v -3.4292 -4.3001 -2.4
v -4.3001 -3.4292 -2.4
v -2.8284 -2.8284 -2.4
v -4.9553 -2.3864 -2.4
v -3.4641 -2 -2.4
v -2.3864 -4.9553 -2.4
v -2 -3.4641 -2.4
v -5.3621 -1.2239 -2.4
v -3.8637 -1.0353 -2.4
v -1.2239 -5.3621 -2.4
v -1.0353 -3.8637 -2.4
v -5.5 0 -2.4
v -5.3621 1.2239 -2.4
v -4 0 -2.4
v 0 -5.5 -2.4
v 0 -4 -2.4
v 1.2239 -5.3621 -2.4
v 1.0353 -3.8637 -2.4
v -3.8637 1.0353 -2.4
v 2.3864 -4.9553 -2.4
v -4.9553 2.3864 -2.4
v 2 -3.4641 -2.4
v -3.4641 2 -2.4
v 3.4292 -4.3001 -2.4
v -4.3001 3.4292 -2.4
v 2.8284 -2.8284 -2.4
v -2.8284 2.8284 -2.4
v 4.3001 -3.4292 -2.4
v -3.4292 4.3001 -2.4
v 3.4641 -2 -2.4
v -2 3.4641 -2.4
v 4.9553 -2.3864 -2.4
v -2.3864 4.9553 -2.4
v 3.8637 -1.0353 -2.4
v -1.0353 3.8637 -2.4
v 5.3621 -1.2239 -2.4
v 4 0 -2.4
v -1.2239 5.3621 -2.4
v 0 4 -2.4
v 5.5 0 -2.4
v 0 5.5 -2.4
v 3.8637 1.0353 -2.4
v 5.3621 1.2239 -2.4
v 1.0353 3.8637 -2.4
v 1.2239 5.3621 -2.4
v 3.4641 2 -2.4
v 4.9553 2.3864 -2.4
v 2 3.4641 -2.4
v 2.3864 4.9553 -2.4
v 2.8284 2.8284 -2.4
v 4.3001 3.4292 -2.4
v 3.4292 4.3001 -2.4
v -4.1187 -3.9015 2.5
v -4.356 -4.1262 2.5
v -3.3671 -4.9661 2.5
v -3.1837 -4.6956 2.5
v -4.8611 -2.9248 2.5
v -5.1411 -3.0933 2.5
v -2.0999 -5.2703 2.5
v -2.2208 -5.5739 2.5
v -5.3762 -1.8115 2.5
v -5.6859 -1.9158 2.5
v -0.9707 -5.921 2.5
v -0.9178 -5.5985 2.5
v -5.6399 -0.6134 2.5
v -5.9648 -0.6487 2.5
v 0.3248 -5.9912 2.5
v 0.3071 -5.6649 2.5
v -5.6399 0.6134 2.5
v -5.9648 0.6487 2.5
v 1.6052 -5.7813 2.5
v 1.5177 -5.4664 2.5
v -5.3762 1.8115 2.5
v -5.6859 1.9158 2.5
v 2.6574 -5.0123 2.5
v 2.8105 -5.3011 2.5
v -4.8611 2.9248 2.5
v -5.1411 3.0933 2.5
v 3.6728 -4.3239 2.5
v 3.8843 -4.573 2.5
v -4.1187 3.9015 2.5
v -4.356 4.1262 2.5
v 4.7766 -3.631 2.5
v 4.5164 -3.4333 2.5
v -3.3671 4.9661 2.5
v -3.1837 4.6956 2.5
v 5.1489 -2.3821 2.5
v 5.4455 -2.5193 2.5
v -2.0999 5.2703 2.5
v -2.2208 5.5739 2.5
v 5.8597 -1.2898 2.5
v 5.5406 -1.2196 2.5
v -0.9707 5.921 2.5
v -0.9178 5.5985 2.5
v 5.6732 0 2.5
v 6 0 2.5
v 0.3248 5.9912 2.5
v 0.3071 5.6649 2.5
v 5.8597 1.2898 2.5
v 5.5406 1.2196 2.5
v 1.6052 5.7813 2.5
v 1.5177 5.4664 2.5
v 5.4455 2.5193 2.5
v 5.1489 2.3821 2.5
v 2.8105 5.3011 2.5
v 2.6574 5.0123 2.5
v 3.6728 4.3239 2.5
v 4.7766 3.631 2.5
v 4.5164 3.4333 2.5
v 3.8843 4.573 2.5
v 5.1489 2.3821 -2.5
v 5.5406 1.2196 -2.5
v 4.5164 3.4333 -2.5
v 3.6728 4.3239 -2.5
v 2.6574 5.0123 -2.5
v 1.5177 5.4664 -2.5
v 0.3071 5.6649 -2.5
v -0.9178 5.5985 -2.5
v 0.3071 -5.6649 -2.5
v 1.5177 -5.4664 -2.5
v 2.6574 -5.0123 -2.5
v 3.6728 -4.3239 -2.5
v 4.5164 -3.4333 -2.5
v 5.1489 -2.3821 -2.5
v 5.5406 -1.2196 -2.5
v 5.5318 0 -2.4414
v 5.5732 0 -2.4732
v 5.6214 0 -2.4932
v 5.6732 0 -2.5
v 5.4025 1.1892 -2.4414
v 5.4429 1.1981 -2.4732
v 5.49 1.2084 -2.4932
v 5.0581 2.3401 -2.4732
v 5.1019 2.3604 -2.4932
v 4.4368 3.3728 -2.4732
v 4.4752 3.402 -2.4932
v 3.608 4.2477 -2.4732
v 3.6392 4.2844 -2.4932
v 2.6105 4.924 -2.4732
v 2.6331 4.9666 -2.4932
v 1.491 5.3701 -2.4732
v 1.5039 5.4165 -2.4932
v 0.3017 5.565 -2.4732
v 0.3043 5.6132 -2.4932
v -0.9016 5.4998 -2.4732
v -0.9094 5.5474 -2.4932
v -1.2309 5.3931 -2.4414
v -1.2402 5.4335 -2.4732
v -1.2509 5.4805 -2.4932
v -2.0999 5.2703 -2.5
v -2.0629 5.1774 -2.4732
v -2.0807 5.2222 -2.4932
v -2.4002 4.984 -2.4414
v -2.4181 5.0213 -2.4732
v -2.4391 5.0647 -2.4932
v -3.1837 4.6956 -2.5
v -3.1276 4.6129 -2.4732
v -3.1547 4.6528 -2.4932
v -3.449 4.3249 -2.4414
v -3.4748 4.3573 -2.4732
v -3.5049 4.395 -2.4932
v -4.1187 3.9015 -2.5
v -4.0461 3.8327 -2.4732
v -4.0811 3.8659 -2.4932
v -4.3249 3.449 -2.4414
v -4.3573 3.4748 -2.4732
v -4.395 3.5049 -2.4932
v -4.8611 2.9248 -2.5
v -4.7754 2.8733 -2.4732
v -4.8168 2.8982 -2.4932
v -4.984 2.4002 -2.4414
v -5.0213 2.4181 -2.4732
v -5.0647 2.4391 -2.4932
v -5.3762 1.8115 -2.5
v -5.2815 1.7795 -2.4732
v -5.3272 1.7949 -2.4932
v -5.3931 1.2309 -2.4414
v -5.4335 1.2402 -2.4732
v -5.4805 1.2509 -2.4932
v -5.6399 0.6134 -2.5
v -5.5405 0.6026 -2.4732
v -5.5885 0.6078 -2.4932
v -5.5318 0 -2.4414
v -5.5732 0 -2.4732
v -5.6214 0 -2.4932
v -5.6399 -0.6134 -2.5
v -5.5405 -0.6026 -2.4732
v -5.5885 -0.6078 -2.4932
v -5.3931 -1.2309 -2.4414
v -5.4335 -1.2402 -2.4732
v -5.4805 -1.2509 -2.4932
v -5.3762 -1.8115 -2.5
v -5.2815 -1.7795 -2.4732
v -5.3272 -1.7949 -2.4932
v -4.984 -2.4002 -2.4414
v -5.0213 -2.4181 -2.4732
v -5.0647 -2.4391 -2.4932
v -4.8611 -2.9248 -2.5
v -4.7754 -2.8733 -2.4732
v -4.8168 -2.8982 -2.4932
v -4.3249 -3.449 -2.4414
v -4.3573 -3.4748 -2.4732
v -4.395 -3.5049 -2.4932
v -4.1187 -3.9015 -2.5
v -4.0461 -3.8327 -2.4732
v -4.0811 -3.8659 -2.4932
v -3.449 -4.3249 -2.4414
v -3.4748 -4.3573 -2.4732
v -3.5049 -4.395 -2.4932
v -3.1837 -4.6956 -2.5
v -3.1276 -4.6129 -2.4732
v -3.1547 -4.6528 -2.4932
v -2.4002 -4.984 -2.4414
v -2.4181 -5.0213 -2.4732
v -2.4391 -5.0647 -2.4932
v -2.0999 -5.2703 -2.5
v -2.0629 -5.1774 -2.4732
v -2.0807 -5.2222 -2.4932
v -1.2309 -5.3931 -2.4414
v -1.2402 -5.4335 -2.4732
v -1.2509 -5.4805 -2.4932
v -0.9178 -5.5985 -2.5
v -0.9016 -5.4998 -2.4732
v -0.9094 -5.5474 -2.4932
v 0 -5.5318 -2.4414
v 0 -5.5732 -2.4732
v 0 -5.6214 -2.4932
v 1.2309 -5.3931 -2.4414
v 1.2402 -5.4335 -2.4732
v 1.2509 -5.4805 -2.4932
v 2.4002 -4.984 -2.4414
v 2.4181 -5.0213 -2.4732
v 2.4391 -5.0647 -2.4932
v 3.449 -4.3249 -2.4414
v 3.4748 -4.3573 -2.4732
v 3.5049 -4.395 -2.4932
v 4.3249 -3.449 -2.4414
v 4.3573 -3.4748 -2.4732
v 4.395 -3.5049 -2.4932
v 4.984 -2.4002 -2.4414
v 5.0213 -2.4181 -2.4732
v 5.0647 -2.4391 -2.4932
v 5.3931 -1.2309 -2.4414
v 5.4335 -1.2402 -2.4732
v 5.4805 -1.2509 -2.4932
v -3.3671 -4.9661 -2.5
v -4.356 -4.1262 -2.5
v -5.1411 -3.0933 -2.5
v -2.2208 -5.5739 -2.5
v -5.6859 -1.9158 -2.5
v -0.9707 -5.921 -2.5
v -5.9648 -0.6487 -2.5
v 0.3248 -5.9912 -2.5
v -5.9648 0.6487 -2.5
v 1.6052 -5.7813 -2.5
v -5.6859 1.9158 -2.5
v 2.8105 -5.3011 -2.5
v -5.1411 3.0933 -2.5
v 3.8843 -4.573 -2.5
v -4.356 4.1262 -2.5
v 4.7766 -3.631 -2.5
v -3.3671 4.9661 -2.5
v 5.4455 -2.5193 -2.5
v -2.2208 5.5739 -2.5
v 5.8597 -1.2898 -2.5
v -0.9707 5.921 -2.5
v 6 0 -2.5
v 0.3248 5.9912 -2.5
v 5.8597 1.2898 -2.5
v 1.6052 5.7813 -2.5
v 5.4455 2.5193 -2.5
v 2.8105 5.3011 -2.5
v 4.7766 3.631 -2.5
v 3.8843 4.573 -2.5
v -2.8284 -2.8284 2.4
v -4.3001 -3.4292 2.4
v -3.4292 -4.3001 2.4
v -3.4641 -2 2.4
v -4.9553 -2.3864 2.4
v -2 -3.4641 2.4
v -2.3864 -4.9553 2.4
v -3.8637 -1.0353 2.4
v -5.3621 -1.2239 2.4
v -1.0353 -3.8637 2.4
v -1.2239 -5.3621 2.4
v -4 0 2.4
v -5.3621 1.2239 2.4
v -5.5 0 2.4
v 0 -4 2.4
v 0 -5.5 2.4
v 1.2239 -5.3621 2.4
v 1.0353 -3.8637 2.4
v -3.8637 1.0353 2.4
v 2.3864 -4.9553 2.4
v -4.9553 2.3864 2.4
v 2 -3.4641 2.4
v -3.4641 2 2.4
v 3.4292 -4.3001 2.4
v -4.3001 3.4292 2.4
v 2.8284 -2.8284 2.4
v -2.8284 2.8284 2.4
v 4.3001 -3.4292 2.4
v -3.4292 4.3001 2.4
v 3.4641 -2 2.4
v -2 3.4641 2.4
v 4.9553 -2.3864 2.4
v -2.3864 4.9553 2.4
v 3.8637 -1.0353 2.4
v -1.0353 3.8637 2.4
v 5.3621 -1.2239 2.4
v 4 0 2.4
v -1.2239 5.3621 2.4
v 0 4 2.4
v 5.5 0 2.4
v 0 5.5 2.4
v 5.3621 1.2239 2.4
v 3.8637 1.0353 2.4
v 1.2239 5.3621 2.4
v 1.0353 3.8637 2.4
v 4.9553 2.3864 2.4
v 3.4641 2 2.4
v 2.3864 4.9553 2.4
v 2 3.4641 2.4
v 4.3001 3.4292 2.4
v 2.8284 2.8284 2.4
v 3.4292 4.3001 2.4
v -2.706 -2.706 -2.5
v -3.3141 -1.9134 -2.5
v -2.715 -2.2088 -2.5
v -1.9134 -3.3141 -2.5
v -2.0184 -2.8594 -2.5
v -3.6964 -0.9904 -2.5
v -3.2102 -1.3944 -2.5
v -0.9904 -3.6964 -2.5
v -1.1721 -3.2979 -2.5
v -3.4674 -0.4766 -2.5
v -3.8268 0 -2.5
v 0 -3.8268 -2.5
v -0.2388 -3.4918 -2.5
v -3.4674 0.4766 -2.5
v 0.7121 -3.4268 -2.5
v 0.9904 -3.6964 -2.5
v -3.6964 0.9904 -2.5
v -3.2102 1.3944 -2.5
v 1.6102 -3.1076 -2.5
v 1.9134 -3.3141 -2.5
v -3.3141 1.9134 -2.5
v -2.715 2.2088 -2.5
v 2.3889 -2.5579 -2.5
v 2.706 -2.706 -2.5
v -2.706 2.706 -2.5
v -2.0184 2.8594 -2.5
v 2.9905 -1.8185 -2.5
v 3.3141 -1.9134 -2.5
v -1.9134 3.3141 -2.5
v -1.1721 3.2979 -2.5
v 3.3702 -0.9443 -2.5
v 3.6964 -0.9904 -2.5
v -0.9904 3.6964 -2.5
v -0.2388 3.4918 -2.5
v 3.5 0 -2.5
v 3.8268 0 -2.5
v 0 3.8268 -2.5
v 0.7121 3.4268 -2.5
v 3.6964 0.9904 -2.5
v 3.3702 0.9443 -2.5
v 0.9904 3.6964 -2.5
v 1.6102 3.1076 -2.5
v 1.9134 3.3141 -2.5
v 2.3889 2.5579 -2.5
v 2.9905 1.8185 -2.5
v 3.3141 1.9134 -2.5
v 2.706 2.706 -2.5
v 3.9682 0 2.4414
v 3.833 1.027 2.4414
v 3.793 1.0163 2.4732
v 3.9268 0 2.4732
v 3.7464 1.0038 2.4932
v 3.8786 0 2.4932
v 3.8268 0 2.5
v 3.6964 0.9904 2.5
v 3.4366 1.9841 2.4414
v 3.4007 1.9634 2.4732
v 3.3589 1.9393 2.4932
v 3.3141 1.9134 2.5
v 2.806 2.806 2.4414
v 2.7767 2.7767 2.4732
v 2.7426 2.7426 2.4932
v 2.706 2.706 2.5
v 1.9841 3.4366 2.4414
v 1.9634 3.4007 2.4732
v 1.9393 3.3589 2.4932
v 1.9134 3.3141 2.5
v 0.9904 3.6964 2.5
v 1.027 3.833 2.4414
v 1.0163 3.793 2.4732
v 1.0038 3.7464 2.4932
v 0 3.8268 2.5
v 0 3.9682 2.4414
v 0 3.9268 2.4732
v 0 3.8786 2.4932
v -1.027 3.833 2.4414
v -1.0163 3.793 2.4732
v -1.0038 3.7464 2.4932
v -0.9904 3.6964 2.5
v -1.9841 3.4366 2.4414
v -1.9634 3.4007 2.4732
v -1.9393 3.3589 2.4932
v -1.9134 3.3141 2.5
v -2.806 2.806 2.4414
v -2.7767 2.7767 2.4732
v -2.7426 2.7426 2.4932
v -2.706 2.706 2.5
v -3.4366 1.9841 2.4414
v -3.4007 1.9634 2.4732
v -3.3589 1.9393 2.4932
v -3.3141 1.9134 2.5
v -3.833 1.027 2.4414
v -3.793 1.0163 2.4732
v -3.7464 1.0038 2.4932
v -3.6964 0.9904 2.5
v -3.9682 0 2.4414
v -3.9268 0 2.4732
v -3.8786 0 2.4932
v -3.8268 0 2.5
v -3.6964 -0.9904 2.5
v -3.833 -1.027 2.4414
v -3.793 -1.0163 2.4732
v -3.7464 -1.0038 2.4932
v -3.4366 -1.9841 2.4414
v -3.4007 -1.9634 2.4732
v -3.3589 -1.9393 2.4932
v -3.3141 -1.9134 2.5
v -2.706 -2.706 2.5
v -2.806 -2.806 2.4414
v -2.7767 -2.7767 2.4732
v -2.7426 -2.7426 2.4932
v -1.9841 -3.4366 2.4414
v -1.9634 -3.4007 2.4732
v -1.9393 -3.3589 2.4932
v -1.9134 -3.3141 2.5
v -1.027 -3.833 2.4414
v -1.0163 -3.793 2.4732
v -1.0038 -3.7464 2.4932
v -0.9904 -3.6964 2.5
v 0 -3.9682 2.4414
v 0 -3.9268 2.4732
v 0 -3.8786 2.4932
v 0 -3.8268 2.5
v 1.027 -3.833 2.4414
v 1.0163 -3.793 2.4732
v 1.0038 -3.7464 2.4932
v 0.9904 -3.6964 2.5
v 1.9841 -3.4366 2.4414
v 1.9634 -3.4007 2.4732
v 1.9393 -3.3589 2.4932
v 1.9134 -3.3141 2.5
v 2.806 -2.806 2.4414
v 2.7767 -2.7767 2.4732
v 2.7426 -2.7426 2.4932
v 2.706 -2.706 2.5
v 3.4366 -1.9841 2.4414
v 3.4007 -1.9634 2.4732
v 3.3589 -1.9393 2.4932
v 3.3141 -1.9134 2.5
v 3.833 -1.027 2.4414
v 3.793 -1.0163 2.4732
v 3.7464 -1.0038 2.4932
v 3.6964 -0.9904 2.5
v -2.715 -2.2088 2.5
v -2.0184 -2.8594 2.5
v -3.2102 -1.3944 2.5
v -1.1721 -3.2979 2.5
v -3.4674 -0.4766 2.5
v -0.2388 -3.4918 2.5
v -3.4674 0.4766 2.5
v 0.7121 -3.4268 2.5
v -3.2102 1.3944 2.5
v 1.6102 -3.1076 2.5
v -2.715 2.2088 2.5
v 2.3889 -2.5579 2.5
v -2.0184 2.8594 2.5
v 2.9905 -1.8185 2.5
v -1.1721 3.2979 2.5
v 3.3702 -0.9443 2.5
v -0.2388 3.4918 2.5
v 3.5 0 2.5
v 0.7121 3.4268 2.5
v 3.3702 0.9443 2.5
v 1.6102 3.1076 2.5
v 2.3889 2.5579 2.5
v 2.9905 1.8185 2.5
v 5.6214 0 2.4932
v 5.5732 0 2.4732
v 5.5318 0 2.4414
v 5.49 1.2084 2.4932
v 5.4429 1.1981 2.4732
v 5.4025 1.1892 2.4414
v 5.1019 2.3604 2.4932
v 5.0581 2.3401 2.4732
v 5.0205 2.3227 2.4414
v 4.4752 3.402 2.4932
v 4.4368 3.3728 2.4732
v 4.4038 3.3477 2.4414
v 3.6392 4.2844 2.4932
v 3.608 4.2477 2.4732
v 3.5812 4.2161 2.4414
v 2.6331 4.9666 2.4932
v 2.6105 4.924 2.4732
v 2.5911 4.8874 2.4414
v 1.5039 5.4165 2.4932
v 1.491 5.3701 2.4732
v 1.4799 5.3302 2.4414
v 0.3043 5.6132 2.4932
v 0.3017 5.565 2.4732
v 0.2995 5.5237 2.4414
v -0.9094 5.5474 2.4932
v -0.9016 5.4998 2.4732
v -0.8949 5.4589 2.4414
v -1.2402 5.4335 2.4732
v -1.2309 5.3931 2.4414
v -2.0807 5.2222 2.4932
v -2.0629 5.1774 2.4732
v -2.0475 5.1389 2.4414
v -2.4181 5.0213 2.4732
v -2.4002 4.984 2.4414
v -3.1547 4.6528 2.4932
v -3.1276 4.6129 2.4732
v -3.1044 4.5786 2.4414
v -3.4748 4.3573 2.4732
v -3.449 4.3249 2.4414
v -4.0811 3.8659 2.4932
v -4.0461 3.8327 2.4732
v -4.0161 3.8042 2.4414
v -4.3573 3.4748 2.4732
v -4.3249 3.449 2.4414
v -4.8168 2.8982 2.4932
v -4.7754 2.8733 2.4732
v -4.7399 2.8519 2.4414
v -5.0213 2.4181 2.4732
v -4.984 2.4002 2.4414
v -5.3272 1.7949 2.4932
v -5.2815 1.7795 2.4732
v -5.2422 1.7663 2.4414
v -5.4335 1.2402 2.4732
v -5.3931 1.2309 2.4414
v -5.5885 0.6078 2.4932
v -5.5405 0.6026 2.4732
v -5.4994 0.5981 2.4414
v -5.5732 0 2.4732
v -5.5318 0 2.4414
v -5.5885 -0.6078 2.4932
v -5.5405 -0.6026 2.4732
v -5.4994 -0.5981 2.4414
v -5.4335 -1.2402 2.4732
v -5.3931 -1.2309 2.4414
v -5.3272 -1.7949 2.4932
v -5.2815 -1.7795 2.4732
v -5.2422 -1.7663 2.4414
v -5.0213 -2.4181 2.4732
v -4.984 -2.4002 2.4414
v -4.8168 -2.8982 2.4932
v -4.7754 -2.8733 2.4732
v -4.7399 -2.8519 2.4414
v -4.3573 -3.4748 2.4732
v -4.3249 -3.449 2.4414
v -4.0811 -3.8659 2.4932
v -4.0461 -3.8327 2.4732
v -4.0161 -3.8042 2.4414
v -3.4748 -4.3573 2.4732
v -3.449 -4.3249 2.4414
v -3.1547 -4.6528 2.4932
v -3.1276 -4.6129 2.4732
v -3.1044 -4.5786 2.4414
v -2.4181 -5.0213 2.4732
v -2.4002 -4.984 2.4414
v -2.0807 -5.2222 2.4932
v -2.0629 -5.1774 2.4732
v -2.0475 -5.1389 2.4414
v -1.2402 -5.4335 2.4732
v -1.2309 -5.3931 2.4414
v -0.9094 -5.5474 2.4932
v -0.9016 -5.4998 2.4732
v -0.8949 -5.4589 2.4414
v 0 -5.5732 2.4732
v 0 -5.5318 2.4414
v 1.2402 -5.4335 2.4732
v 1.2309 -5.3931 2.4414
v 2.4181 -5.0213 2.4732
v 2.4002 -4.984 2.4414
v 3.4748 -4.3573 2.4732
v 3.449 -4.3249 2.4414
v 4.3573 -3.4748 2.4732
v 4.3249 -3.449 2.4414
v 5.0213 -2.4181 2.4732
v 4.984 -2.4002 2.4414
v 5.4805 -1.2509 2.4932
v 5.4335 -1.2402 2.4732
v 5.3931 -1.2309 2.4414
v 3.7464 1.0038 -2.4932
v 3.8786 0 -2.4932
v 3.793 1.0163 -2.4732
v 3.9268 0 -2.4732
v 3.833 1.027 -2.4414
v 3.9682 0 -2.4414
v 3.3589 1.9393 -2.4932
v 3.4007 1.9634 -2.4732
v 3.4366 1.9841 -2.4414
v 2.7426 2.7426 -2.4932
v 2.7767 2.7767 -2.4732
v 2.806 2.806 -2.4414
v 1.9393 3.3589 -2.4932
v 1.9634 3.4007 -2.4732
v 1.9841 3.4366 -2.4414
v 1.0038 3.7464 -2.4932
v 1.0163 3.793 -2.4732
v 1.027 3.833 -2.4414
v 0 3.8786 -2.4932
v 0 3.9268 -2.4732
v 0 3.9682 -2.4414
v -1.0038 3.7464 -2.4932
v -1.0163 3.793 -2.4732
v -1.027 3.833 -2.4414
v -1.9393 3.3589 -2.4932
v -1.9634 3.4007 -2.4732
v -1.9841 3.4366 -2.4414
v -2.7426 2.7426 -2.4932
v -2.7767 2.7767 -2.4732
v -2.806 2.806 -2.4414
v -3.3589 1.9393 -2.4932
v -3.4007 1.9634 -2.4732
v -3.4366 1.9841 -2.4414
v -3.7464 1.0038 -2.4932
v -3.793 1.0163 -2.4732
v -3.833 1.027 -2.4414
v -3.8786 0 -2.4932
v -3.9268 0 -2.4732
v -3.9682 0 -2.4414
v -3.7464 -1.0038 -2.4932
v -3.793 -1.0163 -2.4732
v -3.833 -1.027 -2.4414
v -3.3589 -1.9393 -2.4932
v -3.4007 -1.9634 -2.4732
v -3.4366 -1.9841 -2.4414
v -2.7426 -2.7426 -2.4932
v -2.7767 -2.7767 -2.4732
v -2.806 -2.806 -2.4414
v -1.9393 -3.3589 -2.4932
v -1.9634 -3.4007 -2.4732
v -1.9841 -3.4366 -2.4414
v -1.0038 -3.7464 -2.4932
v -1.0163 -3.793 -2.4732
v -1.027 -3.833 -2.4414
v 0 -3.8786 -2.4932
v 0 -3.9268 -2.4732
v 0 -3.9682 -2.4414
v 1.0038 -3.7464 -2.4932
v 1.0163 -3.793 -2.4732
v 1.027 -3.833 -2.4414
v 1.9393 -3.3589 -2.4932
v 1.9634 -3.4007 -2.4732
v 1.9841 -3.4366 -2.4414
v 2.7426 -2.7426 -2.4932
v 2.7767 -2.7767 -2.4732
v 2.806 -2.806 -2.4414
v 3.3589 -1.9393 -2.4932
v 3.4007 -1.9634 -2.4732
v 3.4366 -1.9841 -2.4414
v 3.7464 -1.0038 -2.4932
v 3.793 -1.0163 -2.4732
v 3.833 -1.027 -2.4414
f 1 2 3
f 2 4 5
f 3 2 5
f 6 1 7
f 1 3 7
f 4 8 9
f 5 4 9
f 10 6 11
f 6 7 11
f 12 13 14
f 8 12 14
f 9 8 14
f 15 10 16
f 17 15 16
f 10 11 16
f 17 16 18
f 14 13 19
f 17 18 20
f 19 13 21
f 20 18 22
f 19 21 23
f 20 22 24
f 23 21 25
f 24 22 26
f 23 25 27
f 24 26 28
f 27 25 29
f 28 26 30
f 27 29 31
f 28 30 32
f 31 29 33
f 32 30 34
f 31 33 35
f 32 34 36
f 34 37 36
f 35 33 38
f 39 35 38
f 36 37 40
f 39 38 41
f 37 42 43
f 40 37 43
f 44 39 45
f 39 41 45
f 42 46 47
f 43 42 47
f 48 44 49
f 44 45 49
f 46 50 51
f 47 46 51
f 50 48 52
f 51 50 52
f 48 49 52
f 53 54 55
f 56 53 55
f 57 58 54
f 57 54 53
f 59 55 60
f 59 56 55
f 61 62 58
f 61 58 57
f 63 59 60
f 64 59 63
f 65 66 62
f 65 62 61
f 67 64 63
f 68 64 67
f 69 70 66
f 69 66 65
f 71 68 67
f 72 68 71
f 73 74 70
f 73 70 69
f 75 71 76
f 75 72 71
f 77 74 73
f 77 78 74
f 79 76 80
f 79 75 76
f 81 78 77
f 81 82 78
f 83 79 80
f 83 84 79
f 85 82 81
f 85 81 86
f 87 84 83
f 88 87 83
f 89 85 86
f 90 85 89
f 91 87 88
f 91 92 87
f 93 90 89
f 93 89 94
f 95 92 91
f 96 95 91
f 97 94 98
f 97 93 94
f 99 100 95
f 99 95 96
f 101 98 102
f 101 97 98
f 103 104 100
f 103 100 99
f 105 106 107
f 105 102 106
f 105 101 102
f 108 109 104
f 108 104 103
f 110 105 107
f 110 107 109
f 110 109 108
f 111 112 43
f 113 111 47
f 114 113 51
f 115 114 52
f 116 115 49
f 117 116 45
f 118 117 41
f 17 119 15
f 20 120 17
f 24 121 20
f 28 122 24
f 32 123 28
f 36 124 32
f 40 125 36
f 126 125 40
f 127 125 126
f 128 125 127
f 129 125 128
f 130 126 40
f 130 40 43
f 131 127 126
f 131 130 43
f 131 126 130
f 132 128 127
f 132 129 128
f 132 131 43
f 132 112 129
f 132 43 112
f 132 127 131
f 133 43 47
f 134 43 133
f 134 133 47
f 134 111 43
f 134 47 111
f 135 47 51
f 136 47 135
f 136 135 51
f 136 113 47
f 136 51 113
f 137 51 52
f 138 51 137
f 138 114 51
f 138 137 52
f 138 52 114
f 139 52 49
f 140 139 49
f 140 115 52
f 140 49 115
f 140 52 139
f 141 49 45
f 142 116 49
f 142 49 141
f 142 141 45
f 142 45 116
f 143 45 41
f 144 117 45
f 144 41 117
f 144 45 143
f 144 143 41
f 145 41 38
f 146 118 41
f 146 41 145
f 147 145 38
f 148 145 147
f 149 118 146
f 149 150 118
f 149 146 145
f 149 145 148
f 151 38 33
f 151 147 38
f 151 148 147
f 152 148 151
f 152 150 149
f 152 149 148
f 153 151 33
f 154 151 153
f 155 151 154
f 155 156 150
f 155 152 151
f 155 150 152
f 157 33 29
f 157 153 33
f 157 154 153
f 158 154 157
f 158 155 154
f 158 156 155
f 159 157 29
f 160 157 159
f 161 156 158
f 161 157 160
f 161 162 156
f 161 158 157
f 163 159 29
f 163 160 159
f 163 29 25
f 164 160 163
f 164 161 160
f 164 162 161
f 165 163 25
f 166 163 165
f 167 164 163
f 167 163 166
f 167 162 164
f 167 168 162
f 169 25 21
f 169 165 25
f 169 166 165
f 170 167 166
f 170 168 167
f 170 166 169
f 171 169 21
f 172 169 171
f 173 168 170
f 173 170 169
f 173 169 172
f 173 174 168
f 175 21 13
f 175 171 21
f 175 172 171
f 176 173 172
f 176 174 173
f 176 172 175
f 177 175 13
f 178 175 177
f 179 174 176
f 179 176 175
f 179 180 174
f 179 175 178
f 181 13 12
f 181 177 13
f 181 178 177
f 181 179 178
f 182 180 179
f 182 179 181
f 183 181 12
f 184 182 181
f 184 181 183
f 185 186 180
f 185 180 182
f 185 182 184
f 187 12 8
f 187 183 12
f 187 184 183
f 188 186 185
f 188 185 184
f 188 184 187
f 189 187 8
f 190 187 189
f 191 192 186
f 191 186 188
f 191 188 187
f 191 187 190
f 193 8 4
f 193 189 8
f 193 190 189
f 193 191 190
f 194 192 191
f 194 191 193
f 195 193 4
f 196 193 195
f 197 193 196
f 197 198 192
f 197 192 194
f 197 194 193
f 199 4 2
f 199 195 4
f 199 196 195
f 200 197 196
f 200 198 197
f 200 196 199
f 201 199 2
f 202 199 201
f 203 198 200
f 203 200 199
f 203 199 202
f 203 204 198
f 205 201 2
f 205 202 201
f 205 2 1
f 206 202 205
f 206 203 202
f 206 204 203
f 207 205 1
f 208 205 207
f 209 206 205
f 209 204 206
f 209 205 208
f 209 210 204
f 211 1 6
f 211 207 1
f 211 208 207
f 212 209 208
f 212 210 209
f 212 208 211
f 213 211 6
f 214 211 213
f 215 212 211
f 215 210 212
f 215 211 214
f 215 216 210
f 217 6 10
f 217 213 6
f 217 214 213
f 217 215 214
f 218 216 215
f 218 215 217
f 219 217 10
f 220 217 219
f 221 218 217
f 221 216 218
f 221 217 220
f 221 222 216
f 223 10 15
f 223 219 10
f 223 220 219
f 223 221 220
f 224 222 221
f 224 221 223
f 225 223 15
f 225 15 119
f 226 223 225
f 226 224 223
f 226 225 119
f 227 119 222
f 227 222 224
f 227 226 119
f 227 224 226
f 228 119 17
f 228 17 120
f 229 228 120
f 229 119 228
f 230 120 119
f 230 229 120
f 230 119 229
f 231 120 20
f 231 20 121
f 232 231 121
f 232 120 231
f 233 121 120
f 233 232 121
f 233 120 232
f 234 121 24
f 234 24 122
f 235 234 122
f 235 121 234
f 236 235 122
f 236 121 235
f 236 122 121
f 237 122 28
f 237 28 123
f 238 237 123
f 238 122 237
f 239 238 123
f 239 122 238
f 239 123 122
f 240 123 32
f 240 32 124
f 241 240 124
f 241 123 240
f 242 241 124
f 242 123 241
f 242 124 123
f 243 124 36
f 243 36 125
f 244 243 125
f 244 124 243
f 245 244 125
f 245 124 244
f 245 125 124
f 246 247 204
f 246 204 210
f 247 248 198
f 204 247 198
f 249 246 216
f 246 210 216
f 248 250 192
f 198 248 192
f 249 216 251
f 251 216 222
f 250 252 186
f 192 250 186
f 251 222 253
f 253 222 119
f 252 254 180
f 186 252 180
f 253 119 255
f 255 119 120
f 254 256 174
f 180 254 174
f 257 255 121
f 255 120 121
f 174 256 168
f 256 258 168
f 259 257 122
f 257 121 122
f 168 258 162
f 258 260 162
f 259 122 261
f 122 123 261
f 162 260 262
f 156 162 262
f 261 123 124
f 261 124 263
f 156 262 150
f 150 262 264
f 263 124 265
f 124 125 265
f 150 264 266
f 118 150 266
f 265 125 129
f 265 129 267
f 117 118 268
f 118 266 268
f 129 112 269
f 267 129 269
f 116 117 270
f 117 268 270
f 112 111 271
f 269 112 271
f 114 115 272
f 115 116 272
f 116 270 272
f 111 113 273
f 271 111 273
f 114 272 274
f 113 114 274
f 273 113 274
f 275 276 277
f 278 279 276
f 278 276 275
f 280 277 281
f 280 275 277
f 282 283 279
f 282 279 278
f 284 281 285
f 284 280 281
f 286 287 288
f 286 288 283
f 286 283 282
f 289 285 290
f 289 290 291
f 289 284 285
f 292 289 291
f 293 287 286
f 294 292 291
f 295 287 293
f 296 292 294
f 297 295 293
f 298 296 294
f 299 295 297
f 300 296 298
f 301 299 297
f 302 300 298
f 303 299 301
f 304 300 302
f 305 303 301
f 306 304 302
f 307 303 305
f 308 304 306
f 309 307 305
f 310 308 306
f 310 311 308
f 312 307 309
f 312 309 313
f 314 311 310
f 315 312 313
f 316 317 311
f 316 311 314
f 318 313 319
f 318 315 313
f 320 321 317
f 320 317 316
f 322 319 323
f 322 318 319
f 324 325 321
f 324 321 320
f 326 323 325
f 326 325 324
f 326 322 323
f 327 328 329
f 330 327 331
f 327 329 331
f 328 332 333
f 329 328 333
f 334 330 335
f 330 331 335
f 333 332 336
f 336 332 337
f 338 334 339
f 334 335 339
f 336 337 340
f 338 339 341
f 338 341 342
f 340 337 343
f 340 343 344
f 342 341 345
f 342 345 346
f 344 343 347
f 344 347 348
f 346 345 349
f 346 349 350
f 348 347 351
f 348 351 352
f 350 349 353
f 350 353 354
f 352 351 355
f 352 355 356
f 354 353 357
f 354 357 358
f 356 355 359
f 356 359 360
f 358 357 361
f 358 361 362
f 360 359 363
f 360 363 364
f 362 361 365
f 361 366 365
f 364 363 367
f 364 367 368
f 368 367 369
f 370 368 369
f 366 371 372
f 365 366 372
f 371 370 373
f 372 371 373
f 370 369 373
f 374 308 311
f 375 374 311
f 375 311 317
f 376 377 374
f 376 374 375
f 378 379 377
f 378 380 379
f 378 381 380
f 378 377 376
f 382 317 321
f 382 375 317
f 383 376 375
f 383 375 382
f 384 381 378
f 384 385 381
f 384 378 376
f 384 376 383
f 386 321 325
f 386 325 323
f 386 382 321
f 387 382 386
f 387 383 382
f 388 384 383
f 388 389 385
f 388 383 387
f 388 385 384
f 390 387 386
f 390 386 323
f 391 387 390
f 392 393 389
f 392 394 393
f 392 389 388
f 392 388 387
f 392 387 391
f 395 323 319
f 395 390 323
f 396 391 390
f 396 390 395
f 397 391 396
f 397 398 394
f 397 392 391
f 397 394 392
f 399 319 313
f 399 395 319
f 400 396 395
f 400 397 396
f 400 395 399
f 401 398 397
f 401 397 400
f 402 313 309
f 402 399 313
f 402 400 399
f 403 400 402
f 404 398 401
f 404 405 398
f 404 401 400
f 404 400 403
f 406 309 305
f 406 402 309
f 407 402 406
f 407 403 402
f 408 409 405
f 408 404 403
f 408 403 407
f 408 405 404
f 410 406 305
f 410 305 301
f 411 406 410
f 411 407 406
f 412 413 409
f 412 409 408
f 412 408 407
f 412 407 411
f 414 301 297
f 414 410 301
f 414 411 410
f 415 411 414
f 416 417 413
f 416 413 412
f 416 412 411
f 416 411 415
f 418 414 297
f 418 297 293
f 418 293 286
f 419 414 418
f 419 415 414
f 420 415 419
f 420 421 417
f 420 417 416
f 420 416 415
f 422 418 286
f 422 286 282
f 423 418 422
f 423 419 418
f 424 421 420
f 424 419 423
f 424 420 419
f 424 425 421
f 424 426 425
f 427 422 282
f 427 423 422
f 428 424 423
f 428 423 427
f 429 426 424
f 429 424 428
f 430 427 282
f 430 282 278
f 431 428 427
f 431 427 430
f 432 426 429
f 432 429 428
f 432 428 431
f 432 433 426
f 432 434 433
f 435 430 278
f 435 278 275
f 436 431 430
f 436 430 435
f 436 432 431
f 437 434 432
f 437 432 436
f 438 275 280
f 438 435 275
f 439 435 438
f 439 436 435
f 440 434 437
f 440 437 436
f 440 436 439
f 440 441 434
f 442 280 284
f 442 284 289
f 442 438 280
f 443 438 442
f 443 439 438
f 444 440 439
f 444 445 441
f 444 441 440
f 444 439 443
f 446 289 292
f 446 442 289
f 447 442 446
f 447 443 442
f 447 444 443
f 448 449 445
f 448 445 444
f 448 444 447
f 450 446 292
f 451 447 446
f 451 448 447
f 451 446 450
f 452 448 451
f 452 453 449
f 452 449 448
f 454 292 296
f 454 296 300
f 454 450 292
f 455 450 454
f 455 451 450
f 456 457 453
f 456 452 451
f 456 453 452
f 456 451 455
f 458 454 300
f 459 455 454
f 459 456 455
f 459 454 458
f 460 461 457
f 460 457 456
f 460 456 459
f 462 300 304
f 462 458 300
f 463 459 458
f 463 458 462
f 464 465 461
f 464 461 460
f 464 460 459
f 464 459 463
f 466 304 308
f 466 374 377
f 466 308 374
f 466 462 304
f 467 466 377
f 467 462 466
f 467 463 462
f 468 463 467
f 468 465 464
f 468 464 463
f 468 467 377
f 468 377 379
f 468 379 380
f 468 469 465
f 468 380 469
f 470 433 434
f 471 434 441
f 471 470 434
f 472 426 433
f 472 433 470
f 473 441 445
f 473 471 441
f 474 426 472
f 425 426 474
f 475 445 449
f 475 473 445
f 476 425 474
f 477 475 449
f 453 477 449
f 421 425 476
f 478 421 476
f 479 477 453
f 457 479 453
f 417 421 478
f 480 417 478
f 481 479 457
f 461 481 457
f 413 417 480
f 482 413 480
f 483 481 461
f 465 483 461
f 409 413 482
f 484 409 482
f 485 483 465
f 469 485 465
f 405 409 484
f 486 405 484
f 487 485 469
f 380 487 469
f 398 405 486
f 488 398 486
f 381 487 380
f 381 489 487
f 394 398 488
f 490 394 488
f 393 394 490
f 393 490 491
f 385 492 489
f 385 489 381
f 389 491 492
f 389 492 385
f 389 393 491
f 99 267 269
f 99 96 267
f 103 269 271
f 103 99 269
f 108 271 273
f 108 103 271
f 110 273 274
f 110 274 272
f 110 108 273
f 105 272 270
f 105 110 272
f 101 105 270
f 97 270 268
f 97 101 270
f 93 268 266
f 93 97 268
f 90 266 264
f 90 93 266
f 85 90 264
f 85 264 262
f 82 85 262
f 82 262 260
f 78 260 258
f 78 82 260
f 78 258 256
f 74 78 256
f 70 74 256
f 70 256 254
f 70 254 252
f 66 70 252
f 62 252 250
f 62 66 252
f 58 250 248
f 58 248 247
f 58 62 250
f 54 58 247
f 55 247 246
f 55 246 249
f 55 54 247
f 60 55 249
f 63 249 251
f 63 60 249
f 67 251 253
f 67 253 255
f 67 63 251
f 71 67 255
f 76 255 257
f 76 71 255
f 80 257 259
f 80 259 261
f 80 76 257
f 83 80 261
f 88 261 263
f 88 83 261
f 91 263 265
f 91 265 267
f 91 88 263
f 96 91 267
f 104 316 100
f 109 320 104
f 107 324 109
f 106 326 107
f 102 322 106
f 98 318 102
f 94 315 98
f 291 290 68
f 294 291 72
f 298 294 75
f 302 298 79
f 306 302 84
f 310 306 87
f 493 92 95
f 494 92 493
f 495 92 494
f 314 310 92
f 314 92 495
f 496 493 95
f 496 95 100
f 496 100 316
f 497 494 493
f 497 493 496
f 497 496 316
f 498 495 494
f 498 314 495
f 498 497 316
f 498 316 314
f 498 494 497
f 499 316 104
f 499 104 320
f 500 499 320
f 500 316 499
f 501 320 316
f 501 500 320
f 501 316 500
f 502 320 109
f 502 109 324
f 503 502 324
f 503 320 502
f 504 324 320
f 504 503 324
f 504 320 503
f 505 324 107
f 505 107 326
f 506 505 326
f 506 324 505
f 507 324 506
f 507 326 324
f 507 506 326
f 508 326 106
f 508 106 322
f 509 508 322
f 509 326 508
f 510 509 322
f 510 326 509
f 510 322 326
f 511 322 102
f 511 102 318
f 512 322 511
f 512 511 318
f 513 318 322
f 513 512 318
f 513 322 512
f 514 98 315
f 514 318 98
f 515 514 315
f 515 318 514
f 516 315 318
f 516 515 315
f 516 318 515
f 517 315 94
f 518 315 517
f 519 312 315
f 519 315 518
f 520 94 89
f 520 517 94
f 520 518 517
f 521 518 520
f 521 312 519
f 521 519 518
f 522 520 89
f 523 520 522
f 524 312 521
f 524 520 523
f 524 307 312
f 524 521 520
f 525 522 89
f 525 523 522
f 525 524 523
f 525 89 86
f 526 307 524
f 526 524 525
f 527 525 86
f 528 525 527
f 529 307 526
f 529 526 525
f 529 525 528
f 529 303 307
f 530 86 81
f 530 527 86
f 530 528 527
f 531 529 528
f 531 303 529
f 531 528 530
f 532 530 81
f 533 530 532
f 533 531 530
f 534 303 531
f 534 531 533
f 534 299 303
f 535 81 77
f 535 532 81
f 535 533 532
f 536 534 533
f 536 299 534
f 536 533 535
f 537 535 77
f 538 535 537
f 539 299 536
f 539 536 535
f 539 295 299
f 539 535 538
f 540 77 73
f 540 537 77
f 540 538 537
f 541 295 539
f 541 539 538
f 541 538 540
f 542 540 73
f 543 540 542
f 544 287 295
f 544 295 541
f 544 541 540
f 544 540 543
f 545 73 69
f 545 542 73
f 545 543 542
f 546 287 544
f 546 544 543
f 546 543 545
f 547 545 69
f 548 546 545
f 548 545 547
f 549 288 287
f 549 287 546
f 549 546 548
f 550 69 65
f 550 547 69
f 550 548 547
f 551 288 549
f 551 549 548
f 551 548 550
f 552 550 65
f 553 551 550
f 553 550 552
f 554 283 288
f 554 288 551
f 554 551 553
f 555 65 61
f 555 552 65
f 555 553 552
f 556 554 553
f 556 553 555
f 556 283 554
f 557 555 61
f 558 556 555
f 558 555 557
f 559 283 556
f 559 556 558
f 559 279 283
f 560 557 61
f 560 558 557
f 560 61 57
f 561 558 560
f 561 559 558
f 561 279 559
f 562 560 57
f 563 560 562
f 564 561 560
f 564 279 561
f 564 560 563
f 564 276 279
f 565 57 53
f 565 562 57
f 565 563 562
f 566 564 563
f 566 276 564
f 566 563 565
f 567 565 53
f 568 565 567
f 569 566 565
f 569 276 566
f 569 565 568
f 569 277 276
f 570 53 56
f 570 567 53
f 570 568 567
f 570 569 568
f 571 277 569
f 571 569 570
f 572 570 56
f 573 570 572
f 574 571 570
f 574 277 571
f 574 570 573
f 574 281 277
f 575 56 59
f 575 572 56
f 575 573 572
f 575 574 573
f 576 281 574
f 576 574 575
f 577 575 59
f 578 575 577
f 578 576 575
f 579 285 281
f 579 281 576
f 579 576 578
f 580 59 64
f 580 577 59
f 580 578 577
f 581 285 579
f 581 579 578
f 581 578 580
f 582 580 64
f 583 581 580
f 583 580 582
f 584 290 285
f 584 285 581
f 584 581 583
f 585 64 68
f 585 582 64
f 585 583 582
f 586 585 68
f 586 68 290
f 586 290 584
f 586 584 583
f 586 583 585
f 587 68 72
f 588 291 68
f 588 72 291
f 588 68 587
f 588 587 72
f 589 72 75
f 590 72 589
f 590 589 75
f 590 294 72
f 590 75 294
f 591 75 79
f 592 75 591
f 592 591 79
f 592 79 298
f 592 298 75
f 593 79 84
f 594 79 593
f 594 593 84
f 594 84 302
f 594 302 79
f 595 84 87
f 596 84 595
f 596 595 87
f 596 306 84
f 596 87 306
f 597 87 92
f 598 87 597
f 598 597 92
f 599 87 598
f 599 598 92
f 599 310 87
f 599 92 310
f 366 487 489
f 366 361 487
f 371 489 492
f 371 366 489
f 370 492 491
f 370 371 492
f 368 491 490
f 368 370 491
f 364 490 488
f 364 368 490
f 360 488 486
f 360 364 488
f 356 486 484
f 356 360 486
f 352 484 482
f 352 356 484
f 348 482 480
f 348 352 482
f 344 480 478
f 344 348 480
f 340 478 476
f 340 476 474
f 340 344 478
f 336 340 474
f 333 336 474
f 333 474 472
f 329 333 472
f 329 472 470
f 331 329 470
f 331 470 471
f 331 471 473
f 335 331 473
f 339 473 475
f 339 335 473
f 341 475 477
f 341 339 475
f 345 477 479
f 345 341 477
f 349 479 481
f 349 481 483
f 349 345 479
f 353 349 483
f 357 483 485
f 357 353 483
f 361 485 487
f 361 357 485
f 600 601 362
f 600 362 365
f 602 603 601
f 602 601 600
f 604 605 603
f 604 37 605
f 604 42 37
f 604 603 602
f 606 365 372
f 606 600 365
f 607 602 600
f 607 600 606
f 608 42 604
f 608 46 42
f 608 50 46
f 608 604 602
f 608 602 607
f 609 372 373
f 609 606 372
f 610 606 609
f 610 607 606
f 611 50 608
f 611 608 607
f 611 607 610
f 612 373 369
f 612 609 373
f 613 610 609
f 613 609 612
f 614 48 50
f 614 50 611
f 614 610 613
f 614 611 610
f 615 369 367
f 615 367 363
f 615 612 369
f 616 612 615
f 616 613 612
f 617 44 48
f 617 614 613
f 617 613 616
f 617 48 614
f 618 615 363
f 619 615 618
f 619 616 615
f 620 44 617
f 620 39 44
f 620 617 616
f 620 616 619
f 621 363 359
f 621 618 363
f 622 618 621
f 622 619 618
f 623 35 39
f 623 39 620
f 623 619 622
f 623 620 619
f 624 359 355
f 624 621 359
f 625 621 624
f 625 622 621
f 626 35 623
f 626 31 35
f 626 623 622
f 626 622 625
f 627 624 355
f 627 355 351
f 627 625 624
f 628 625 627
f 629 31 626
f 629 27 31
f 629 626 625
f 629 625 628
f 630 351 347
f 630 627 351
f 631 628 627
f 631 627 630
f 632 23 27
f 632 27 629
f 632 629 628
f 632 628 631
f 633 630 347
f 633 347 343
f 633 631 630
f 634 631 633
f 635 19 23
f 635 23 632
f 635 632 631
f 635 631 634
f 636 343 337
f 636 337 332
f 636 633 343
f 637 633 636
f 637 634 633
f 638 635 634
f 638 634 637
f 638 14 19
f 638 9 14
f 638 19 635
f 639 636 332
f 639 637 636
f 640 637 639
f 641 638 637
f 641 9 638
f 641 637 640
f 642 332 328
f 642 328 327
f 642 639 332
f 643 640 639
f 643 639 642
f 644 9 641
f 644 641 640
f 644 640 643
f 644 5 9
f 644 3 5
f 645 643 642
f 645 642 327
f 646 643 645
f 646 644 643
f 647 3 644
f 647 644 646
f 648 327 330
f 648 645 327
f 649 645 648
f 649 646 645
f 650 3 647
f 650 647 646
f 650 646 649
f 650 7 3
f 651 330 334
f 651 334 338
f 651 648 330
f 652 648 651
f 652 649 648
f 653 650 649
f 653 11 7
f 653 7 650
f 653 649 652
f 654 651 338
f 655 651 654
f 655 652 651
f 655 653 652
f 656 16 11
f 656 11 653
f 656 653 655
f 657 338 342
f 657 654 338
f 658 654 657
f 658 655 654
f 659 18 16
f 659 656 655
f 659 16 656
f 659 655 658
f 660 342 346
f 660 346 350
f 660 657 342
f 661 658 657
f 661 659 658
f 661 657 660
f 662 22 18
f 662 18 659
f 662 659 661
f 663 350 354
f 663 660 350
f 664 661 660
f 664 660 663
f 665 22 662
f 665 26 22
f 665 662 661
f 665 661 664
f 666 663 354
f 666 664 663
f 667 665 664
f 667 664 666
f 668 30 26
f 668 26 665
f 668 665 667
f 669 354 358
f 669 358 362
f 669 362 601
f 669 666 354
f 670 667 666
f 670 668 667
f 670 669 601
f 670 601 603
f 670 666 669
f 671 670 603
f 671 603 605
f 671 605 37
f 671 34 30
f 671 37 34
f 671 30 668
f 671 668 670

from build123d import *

# Parameters (mm, degrees)
SKETCH_1_R          = 6
SKETCH_1_R_2        = 3.5
EXTRUDE_1_DEPTH     = 2.5
SKETCH_2_R          = 5.5
SKETCH_2_R_2        = 4
CUT_EXTRUDE_1_DEPTH = 0.1
FILLET_1_R          = 0.2


with BuildPart() as part:
    # 草图1 → 凸台-拉伸1 (new, symmetric)
    with BuildSketch(Plane.XY):
        Circle(SKETCH_1_R)
        Circle(SKETCH_1_R_2, mode=Mode.SUBTRACT)
    extrude(amount=EXTRUDE_1_DEPTH, both=True)

    # 草图2 → 切除-拉伸1 (cut)
    with BuildSketch(Plane.XY.offset(2.5)):
        Circle(SKETCH_2_R)
        Circle(SKETCH_2_R_2, mode=Mode.SUBTRACT)
    cut_extrude_1 = extrude(amount=-CUT_EXTRUDE_1_DEPTH, mode=Mode.SUBTRACT)

    # 镜向1: 切除-拉伸1 across plane
    add(cut_extrude_1.mirror(Plane.XY), mode=Mode.SUBTRACT)

    # 圆角1
    # the kernel refuses this fillet: 0.2 mm, written as the material it takes off along each edge
    with BuildSketch(Plane(origin=(0, 0, 2.5), x_dir=(1, 0, 0), z_dir=(0, -1, 0))) as fillet_1_piece_1:
        with BuildLine():
            CenterArc((5.673205081, -0.2), FILLET_1_R, 90, 60)
            Line((5.5, -0.1), (5.496535898, -0.098))
            ThreePointArc((5.496535898, -0.098), (5.496, -0.05), (5.496, 0))
            Line((5.496, 0), (5.5, 0.004))
            Line((5.5, 0.004), (5.673205081, 0.004))
            Line((5.673205081, 0.004), (5.673205081, 0))
        make_face()
    revolve(axis=Axis((0, 0, 2.5), (0, 0, 1)), mode=Mode.SUBTRACT)
    with BuildSketch(Plane(origin=(0, 0, 2.5), x_dir=(1, 0, 0), z_dir=(0, -1, 0))) as fillet_1_piece_2:
        with BuildLine():
            CenterArc((3.826794919, -0.2), FILLET_1_R, 30, 60)
            Line((3.826794919, 0), (3.826794919, 0.004))
            Line((3.826794919, 0.004), (4, 0.004))
            Line((4, 0.004), (4.004, 0))
            ThreePointArc((4.004, 0), (4.004, -0.05), (4.003464102, -0.098))
            Line((4.003464102, -0.098), (4, -0.1))
        make_face()
    revolve(axis=Axis((0, 0, 2.5), (0, 0, 1)), mode=Mode.SUBTRACT)
    with BuildSketch(Plane(origin=(0, 0, -2.5), x_dir=(1, 0, 0), z_dir=(0, -1, 0))) as fillet_1_piece_3:
        with BuildLine():
            CenterArc((3.826794919, 0.2), FILLET_1_R, 270, 60)
            Line((3.826794919, 0), (3.826794919, -0.004))
            Line((3.826794919, -0.004), (4, -0.004))
            Line((4, -0.004), (4.004, 0))
            ThreePointArc((4.004, 0), (4.004, 0.05), (4.003464102, 0.098))
            Line((4.003464102, 0.098), (4, 0.1))
        make_face()
    revolve(axis=Axis((0, 0, -2.5), (0, 0, 1)), mode=Mode.SUBTRACT)
    with BuildSketch(Plane(origin=(0, 0, -2.5), x_dir=(1, 0, 0), z_dir=(0, -1, 0))) as fillet_1_piece_4:
        with BuildLine():
            CenterArc((5.673205081, 0.2), FILLET_1_R, 210, 60)
            Line((5.5, 0.1), (5.496535898, 0.098))
            ThreePointArc((5.496535898, 0.098), (5.496, 0.05), (5.496, 0))
            Line((5.496, 0), (5.5, -0.004))
            Line((5.5, -0.004), (5.673205081, -0.004))
            Line((5.673205081, -0.004), (5.673205081, 0))
        make_face()
    revolve(axis=Axis((0, 0, -2.5), (0, 0, 1)), mode=Mode.SUBTRACT)


solid = part.part
